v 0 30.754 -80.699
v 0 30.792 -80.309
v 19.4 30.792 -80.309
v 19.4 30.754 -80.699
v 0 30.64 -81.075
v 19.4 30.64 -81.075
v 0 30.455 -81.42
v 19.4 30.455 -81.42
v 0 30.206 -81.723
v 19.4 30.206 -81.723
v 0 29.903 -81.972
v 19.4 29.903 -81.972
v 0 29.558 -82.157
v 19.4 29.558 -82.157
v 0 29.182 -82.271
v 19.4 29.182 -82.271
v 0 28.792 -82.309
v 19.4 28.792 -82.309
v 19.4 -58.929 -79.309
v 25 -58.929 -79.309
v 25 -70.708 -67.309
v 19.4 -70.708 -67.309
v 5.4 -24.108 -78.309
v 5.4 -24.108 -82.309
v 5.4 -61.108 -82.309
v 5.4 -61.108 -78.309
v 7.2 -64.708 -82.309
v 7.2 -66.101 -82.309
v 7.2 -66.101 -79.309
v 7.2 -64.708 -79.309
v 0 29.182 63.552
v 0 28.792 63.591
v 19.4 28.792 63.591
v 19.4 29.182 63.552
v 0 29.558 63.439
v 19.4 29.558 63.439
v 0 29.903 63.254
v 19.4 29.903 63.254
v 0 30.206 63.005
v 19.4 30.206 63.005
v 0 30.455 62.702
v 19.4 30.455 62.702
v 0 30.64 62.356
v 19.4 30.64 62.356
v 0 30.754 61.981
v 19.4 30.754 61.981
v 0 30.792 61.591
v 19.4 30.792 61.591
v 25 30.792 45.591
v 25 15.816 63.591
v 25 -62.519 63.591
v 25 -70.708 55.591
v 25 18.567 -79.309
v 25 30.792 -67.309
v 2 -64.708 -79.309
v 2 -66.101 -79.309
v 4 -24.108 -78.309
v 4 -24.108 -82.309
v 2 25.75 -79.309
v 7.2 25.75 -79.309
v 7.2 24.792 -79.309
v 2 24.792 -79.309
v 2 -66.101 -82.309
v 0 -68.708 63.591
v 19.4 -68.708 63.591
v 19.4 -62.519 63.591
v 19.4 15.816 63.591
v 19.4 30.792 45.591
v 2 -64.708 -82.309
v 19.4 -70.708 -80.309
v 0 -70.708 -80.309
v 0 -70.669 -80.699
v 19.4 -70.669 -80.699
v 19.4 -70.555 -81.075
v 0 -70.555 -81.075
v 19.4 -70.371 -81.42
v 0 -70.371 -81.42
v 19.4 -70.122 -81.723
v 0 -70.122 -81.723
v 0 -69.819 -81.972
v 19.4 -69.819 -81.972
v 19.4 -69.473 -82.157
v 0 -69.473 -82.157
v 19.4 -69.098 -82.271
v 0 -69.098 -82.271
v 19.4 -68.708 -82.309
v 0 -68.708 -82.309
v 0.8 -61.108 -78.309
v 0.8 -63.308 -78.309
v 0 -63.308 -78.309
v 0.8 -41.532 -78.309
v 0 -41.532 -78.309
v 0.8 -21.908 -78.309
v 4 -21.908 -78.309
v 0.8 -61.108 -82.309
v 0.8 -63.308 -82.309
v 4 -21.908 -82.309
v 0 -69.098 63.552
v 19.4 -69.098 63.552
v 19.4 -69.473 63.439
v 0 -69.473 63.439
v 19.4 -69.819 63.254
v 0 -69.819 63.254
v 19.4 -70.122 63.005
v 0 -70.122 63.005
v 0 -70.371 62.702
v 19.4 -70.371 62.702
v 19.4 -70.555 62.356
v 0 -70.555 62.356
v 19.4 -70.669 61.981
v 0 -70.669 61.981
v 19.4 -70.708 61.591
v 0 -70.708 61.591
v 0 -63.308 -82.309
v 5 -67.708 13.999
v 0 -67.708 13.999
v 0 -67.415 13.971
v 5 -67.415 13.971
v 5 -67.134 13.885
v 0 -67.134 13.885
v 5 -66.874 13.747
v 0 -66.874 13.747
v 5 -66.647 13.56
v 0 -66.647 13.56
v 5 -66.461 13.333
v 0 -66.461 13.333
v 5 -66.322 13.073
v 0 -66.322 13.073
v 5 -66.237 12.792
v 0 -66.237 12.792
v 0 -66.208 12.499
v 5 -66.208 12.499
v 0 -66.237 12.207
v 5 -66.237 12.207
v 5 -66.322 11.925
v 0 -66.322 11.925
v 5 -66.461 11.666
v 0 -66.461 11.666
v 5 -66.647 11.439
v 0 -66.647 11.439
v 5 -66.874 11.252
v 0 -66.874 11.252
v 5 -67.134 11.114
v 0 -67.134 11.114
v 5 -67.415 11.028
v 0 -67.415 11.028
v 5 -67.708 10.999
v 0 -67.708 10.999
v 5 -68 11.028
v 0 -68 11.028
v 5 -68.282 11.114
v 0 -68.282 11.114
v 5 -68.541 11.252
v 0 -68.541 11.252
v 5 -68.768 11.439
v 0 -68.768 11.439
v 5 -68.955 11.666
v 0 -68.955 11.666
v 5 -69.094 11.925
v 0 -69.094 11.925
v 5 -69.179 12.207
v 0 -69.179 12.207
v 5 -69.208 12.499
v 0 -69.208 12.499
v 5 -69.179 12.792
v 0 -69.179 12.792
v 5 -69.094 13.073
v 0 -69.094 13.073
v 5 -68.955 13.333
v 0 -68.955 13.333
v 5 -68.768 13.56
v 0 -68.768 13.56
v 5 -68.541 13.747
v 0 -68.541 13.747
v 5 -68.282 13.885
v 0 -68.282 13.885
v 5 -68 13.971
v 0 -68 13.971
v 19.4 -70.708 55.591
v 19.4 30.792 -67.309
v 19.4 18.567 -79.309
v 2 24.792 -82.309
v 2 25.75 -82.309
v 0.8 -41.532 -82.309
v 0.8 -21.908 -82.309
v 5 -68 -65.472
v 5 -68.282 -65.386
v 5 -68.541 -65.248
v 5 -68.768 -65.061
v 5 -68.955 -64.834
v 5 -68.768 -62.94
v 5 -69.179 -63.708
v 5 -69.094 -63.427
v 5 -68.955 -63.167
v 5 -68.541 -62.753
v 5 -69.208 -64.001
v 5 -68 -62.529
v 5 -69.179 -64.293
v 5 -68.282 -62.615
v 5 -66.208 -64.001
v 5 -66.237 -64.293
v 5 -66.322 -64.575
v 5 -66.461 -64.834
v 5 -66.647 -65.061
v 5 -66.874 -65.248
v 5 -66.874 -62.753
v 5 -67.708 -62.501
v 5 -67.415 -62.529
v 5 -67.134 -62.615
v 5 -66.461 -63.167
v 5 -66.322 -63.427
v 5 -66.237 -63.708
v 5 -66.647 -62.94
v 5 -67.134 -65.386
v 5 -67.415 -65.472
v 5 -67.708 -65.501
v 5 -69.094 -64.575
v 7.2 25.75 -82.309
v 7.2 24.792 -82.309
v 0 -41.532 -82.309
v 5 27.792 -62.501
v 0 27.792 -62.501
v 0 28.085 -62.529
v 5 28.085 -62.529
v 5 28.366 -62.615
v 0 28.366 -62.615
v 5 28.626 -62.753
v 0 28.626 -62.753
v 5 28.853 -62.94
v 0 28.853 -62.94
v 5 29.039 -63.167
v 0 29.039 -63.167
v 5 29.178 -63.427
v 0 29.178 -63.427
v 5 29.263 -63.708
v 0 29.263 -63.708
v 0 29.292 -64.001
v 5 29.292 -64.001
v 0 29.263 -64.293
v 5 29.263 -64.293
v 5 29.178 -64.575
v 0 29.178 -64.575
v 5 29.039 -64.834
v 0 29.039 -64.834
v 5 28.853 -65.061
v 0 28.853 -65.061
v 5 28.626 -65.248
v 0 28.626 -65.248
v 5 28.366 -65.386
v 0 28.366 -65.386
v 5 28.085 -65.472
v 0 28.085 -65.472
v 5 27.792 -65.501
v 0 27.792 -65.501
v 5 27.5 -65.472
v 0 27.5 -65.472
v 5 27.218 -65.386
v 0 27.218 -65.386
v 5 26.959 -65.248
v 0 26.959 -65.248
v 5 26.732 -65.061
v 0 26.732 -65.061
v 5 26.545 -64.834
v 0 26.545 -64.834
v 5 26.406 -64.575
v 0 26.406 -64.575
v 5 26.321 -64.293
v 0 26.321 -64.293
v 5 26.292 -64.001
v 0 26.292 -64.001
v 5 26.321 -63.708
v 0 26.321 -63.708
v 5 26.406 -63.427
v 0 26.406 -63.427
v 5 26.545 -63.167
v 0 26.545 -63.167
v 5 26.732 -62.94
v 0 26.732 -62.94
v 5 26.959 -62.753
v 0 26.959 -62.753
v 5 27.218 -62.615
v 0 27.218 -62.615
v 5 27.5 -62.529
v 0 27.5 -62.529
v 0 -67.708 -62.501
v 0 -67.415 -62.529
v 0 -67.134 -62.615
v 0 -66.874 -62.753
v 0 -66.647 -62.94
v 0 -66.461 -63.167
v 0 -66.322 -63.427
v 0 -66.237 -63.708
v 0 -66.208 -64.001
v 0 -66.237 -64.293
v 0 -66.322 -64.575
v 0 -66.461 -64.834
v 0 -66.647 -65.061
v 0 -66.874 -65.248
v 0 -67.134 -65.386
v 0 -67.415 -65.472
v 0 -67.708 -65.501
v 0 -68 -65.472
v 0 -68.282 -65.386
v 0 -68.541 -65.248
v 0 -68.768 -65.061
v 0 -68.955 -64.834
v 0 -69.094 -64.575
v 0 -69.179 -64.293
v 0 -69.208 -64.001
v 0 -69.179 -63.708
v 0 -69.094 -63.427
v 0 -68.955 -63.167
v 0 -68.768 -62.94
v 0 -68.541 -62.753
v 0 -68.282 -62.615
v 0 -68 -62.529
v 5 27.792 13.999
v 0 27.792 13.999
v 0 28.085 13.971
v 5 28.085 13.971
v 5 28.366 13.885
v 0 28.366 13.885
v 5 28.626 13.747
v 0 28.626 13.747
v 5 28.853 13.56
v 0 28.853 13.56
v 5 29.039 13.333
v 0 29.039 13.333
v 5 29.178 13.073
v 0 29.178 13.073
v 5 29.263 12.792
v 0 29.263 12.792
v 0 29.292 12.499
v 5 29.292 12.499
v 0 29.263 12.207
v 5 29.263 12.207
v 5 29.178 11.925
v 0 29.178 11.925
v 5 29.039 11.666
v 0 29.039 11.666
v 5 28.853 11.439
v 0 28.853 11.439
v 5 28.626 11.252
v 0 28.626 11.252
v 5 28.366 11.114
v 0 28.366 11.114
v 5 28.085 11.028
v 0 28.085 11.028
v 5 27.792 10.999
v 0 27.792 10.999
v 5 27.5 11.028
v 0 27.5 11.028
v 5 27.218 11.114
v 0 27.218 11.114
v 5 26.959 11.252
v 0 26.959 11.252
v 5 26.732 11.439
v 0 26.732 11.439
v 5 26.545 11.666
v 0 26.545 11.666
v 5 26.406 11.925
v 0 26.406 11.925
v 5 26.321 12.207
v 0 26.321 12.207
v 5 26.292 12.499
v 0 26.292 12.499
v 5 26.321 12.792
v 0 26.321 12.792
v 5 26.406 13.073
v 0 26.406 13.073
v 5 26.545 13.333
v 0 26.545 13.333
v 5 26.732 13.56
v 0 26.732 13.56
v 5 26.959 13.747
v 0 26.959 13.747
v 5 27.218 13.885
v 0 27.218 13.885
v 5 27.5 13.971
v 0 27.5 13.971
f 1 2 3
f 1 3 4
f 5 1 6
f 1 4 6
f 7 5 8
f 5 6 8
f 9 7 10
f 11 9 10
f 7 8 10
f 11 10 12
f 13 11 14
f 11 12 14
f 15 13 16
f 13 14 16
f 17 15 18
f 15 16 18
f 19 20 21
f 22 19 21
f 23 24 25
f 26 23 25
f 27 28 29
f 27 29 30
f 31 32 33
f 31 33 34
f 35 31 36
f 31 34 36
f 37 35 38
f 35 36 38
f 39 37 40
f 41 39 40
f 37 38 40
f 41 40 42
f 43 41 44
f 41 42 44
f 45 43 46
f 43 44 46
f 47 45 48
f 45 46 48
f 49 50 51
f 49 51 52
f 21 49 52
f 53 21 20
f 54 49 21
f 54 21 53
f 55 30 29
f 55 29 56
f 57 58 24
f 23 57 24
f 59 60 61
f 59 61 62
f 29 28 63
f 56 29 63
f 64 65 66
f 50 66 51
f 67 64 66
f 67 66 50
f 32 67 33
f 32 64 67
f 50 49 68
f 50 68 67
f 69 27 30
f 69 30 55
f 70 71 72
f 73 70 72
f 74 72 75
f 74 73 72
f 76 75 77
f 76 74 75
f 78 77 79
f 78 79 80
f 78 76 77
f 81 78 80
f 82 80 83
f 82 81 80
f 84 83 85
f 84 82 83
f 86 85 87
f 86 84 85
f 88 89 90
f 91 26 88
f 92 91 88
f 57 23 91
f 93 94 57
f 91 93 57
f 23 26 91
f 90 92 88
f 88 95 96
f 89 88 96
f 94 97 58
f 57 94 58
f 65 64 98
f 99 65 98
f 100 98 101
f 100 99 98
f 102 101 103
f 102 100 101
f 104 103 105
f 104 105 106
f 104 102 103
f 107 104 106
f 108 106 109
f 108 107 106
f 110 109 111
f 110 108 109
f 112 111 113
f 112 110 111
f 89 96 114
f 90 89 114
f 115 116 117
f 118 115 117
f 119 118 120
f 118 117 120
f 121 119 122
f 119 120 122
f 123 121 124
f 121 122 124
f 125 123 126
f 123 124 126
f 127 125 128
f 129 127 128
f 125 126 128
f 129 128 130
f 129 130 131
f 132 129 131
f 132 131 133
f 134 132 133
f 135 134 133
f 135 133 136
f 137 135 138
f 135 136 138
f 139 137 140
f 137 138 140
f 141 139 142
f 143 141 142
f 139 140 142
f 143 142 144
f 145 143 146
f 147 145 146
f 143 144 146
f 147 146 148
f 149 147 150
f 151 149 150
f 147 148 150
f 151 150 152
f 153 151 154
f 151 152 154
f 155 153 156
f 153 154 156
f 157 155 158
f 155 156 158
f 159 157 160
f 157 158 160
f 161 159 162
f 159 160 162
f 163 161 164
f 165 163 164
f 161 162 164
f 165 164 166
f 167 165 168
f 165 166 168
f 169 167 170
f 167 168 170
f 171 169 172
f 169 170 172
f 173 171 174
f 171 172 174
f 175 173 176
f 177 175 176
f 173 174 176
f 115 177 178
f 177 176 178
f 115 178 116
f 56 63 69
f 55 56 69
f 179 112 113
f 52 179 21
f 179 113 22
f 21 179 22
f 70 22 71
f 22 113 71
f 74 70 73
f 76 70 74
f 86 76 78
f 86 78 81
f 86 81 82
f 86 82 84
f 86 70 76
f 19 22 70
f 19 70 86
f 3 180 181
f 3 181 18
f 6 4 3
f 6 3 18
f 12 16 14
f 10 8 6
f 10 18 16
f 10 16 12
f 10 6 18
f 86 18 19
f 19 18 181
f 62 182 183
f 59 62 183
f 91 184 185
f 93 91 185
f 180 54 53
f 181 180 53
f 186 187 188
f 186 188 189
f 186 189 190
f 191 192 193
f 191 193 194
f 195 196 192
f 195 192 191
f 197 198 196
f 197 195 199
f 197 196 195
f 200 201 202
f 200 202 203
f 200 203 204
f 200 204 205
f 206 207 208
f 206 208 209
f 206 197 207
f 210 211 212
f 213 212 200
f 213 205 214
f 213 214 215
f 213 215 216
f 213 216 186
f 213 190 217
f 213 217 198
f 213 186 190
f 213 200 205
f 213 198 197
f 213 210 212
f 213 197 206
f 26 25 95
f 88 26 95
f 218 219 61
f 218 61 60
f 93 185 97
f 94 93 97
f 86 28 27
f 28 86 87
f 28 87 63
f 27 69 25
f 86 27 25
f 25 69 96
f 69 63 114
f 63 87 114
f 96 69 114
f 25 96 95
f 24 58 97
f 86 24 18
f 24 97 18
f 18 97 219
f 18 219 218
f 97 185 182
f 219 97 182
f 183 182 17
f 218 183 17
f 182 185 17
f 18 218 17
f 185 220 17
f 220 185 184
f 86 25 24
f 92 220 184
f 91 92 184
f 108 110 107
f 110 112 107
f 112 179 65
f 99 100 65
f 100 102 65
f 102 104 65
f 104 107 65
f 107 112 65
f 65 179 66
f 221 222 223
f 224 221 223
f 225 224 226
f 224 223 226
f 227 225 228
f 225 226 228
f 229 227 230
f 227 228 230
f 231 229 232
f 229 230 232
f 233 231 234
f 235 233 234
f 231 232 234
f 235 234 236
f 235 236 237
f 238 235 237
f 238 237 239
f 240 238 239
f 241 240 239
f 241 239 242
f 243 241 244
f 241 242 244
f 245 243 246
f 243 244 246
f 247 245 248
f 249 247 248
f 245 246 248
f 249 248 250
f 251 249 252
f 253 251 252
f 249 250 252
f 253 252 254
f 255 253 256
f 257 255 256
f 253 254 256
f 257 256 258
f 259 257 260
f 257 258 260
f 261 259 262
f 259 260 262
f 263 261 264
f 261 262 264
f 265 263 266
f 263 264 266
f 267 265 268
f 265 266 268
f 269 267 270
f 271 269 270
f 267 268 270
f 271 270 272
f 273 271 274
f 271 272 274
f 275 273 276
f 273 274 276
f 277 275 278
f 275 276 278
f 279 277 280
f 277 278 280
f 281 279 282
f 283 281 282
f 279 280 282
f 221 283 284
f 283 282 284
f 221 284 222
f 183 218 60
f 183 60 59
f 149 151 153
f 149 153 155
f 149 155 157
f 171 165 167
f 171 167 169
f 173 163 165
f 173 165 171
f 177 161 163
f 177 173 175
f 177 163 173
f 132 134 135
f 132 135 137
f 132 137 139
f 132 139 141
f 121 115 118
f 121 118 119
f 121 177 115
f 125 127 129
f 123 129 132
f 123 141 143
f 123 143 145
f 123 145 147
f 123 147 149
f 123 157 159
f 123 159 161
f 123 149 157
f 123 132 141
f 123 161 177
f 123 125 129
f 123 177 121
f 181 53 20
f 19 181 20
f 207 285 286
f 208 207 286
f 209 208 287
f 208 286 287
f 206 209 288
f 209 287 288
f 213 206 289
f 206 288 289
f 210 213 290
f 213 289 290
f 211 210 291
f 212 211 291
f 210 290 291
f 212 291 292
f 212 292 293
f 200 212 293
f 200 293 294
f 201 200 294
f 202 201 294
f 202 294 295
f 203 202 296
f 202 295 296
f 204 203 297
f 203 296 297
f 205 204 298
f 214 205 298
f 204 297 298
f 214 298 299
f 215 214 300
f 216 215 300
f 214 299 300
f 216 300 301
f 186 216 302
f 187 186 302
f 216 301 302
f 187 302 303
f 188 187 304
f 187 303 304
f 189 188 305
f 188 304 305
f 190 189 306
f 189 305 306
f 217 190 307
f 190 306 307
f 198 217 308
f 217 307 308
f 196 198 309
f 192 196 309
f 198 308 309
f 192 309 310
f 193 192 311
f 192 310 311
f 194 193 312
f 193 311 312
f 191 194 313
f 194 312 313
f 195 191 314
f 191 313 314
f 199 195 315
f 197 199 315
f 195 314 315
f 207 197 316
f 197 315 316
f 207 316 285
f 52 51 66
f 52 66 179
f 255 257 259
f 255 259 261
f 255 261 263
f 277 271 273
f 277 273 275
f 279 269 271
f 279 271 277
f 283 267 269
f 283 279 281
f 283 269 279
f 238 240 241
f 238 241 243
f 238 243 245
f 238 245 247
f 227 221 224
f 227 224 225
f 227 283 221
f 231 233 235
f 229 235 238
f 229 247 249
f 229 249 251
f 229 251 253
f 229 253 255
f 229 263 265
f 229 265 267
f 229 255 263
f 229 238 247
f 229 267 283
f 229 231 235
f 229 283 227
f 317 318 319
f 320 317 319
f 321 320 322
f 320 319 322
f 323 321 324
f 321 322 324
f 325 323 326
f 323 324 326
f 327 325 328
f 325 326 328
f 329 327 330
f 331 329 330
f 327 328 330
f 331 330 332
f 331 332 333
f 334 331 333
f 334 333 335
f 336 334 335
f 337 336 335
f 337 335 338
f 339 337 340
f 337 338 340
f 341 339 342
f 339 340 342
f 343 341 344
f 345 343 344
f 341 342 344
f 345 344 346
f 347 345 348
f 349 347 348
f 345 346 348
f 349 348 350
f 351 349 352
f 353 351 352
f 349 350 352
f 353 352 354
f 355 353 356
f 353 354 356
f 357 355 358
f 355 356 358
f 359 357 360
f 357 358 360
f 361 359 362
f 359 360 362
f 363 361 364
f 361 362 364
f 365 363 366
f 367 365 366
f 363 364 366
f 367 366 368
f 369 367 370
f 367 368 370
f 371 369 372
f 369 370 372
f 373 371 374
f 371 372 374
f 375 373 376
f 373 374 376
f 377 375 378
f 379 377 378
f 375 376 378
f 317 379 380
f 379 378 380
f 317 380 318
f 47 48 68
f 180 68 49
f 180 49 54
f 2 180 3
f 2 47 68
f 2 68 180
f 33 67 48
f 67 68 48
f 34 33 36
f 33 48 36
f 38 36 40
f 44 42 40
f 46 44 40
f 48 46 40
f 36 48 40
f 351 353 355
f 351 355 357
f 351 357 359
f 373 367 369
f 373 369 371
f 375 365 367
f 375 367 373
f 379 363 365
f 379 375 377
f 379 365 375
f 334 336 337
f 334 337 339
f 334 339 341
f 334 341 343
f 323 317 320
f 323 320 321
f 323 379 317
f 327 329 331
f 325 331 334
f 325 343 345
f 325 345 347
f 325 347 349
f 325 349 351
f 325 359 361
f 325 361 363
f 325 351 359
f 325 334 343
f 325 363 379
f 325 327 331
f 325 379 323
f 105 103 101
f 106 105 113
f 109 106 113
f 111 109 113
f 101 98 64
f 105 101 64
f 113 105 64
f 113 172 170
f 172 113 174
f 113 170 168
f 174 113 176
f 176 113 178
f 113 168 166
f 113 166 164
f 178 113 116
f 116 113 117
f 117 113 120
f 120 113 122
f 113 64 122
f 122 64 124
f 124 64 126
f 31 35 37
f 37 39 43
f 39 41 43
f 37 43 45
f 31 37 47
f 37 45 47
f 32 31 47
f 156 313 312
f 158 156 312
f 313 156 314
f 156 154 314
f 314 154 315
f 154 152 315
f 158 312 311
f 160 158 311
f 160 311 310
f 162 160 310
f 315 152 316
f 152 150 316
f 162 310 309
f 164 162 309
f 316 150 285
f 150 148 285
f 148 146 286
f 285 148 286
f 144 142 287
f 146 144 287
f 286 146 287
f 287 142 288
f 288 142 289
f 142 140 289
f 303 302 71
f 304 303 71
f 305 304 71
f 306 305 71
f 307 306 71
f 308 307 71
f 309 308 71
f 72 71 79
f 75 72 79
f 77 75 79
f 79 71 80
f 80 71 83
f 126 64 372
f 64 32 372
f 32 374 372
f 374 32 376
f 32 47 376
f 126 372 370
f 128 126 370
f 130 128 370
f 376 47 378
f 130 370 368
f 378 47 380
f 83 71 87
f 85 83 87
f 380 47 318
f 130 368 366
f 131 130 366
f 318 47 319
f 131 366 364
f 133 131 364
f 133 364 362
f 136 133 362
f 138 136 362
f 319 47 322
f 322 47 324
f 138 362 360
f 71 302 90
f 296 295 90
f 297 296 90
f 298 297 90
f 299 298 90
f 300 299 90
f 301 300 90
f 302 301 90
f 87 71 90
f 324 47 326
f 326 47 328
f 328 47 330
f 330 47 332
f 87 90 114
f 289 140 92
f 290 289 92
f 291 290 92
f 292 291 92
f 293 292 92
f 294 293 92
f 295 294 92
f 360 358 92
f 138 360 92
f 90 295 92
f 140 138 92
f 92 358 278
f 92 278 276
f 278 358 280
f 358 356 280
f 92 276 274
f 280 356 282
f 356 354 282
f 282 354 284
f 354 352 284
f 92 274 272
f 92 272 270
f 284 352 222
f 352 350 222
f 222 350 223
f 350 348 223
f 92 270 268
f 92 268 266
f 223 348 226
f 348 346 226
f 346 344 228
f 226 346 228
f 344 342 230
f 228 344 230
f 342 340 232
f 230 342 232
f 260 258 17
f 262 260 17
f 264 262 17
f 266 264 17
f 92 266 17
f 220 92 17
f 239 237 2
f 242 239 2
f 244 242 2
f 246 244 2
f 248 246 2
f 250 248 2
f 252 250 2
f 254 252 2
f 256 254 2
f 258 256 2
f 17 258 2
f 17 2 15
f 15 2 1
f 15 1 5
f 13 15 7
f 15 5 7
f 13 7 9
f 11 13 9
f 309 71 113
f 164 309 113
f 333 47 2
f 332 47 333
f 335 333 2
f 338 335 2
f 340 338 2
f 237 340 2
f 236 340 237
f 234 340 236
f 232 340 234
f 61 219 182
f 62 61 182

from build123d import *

# Parameters (mm, degrees)
SKETCH1_W           = 145.9
SKETCH1_H           = 101.5
BOSS_EXTRUDE1_DEPTH = 25
CUT_EXTRUDE1_DEPTH  = 5.6
FILLET1_R           = 2
SKETCH3_R           = 1.5
CUT_EXTRUDE2_DEPTH  = 5
SKETCH4_W           = 5.2
SKETCH4_H           = 1.393306894
SKETCH4_H_2         = 0.957581617
CUT_EXTRUDE3_DEPTH  = 3
CUT_EXTRUDE4_DEPTH  = 4


with BuildPart() as part:
    # Sketch1 → Boss-Extrude1 (new body)
    with BuildSketch(Plane(origin=(0, 0, 0), x_dir=(0, 0, -1), z_dir=(1, 0, 0))):
        with Locations((9.359172662, -19.957733813)):
            Rectangle(SKETCH1_W, SKETCH1_H)
    extrude(amount=BOSS_EXTRUDE1_DEPTH)

    # Sketch2 → Cut-Extrude1 (cut)
    with BuildSketch(Plane(origin=(25, 0, 0), x_dir=(0, 0, -1), z_dir=(1, 0, 0))):
        Polygon((67.309172662, 30.792266187), (79.309172662, 18.566731656), (79.309172662, -58.929107722), (67.309172662, -70.707733813), (82.309172662, -70.707733813), (82.309172662, 30.792266187), align=None)
        Polygon((-45.590827338, 30.792266187), (-63.590827338, 15.815954922), (-63.590827338, 30.792266187), align=None)
        Polygon((-63.590827338, -62.51914727), (-55.590827338, -70.707733813), (-63.590827338, -70.707733813), align=None)
    extrude(amount=-CUT_EXTRUDE1_DEPTH, mode=Mode.SUBTRACT)

    # Fillet1
    fillet1_edges = [part.edges().sort_by_distance(p)[0] for p in [
        (9.7, 30.792266187, -82.309172662),
        (9.7, -70.707733813, -82.309172662),
        (9.7, 30.792266187, 63.590827338),
        (9.7, -70.707733813, 63.590827338),
    ]]
    fillet(fillet1_edges, radius=FILLET1_R)

    # Sketch3 → Cut-Extrude2 (cut)
    with BuildSketch(Plane.ZY):
        with Locations((-64.000619116, 27.792266187)):
            Circle(SKETCH3_R)
        with Locations((12.499380884, 27.792266187)):
            Circle(SKETCH3_R)
        with Locations((-64.000619116, -67.707733813)):
            Circle(SKETCH3_R)
        with Locations((12.499380884, -67.707733813)):
            Circle(SKETCH3_R)
    extrude(amount=-CUT_EXTRUDE2_DEPTH, mode=Mode.SUBTRACT)

    # Sketch4 → Cut-Extrude3 (cut)
    with BuildSketch(Plane(origin=(0, 0, -82.309172662), x_dir=(-1, 0, 0), z_dir=(0, 0, -1))):
        with Locations((-4.6, -65.40438726)):
            Rectangle(SKETCH4_W, SKETCH4_H)
        with Locations((-4.6, 25.271056996)):
            Rectangle(SKETCH4_W, SKETCH4_H_2)
    extrude(amount=-CUT_EXTRUDE3_DEPTH, mode=Mode.SUBTRACT)

    # Sketch5 → Cut-Extrude4 (cut)
    with BuildSketch(Plane(origin=(0, 0, -82.309172662), x_dir=(-1, 0, 0), z_dir=(0, 0, -1))):
        Polygon((0, -41.532404589), (-0.8, -41.532404589), (-0.8, -21.907733813), (-4, -21.907733813), (-4, -24.107733813), (-5.4, -24.107733813), (-5.4, -61.107733813), (-0.8, -61.107733813), (-0.8, -63.307733813), (0, -63.307733813), align=None)
    extrude(amount=-CUT_EXTRUDE4_DEPTH, mode=Mode.SUBTRACT)


solid = part.part
